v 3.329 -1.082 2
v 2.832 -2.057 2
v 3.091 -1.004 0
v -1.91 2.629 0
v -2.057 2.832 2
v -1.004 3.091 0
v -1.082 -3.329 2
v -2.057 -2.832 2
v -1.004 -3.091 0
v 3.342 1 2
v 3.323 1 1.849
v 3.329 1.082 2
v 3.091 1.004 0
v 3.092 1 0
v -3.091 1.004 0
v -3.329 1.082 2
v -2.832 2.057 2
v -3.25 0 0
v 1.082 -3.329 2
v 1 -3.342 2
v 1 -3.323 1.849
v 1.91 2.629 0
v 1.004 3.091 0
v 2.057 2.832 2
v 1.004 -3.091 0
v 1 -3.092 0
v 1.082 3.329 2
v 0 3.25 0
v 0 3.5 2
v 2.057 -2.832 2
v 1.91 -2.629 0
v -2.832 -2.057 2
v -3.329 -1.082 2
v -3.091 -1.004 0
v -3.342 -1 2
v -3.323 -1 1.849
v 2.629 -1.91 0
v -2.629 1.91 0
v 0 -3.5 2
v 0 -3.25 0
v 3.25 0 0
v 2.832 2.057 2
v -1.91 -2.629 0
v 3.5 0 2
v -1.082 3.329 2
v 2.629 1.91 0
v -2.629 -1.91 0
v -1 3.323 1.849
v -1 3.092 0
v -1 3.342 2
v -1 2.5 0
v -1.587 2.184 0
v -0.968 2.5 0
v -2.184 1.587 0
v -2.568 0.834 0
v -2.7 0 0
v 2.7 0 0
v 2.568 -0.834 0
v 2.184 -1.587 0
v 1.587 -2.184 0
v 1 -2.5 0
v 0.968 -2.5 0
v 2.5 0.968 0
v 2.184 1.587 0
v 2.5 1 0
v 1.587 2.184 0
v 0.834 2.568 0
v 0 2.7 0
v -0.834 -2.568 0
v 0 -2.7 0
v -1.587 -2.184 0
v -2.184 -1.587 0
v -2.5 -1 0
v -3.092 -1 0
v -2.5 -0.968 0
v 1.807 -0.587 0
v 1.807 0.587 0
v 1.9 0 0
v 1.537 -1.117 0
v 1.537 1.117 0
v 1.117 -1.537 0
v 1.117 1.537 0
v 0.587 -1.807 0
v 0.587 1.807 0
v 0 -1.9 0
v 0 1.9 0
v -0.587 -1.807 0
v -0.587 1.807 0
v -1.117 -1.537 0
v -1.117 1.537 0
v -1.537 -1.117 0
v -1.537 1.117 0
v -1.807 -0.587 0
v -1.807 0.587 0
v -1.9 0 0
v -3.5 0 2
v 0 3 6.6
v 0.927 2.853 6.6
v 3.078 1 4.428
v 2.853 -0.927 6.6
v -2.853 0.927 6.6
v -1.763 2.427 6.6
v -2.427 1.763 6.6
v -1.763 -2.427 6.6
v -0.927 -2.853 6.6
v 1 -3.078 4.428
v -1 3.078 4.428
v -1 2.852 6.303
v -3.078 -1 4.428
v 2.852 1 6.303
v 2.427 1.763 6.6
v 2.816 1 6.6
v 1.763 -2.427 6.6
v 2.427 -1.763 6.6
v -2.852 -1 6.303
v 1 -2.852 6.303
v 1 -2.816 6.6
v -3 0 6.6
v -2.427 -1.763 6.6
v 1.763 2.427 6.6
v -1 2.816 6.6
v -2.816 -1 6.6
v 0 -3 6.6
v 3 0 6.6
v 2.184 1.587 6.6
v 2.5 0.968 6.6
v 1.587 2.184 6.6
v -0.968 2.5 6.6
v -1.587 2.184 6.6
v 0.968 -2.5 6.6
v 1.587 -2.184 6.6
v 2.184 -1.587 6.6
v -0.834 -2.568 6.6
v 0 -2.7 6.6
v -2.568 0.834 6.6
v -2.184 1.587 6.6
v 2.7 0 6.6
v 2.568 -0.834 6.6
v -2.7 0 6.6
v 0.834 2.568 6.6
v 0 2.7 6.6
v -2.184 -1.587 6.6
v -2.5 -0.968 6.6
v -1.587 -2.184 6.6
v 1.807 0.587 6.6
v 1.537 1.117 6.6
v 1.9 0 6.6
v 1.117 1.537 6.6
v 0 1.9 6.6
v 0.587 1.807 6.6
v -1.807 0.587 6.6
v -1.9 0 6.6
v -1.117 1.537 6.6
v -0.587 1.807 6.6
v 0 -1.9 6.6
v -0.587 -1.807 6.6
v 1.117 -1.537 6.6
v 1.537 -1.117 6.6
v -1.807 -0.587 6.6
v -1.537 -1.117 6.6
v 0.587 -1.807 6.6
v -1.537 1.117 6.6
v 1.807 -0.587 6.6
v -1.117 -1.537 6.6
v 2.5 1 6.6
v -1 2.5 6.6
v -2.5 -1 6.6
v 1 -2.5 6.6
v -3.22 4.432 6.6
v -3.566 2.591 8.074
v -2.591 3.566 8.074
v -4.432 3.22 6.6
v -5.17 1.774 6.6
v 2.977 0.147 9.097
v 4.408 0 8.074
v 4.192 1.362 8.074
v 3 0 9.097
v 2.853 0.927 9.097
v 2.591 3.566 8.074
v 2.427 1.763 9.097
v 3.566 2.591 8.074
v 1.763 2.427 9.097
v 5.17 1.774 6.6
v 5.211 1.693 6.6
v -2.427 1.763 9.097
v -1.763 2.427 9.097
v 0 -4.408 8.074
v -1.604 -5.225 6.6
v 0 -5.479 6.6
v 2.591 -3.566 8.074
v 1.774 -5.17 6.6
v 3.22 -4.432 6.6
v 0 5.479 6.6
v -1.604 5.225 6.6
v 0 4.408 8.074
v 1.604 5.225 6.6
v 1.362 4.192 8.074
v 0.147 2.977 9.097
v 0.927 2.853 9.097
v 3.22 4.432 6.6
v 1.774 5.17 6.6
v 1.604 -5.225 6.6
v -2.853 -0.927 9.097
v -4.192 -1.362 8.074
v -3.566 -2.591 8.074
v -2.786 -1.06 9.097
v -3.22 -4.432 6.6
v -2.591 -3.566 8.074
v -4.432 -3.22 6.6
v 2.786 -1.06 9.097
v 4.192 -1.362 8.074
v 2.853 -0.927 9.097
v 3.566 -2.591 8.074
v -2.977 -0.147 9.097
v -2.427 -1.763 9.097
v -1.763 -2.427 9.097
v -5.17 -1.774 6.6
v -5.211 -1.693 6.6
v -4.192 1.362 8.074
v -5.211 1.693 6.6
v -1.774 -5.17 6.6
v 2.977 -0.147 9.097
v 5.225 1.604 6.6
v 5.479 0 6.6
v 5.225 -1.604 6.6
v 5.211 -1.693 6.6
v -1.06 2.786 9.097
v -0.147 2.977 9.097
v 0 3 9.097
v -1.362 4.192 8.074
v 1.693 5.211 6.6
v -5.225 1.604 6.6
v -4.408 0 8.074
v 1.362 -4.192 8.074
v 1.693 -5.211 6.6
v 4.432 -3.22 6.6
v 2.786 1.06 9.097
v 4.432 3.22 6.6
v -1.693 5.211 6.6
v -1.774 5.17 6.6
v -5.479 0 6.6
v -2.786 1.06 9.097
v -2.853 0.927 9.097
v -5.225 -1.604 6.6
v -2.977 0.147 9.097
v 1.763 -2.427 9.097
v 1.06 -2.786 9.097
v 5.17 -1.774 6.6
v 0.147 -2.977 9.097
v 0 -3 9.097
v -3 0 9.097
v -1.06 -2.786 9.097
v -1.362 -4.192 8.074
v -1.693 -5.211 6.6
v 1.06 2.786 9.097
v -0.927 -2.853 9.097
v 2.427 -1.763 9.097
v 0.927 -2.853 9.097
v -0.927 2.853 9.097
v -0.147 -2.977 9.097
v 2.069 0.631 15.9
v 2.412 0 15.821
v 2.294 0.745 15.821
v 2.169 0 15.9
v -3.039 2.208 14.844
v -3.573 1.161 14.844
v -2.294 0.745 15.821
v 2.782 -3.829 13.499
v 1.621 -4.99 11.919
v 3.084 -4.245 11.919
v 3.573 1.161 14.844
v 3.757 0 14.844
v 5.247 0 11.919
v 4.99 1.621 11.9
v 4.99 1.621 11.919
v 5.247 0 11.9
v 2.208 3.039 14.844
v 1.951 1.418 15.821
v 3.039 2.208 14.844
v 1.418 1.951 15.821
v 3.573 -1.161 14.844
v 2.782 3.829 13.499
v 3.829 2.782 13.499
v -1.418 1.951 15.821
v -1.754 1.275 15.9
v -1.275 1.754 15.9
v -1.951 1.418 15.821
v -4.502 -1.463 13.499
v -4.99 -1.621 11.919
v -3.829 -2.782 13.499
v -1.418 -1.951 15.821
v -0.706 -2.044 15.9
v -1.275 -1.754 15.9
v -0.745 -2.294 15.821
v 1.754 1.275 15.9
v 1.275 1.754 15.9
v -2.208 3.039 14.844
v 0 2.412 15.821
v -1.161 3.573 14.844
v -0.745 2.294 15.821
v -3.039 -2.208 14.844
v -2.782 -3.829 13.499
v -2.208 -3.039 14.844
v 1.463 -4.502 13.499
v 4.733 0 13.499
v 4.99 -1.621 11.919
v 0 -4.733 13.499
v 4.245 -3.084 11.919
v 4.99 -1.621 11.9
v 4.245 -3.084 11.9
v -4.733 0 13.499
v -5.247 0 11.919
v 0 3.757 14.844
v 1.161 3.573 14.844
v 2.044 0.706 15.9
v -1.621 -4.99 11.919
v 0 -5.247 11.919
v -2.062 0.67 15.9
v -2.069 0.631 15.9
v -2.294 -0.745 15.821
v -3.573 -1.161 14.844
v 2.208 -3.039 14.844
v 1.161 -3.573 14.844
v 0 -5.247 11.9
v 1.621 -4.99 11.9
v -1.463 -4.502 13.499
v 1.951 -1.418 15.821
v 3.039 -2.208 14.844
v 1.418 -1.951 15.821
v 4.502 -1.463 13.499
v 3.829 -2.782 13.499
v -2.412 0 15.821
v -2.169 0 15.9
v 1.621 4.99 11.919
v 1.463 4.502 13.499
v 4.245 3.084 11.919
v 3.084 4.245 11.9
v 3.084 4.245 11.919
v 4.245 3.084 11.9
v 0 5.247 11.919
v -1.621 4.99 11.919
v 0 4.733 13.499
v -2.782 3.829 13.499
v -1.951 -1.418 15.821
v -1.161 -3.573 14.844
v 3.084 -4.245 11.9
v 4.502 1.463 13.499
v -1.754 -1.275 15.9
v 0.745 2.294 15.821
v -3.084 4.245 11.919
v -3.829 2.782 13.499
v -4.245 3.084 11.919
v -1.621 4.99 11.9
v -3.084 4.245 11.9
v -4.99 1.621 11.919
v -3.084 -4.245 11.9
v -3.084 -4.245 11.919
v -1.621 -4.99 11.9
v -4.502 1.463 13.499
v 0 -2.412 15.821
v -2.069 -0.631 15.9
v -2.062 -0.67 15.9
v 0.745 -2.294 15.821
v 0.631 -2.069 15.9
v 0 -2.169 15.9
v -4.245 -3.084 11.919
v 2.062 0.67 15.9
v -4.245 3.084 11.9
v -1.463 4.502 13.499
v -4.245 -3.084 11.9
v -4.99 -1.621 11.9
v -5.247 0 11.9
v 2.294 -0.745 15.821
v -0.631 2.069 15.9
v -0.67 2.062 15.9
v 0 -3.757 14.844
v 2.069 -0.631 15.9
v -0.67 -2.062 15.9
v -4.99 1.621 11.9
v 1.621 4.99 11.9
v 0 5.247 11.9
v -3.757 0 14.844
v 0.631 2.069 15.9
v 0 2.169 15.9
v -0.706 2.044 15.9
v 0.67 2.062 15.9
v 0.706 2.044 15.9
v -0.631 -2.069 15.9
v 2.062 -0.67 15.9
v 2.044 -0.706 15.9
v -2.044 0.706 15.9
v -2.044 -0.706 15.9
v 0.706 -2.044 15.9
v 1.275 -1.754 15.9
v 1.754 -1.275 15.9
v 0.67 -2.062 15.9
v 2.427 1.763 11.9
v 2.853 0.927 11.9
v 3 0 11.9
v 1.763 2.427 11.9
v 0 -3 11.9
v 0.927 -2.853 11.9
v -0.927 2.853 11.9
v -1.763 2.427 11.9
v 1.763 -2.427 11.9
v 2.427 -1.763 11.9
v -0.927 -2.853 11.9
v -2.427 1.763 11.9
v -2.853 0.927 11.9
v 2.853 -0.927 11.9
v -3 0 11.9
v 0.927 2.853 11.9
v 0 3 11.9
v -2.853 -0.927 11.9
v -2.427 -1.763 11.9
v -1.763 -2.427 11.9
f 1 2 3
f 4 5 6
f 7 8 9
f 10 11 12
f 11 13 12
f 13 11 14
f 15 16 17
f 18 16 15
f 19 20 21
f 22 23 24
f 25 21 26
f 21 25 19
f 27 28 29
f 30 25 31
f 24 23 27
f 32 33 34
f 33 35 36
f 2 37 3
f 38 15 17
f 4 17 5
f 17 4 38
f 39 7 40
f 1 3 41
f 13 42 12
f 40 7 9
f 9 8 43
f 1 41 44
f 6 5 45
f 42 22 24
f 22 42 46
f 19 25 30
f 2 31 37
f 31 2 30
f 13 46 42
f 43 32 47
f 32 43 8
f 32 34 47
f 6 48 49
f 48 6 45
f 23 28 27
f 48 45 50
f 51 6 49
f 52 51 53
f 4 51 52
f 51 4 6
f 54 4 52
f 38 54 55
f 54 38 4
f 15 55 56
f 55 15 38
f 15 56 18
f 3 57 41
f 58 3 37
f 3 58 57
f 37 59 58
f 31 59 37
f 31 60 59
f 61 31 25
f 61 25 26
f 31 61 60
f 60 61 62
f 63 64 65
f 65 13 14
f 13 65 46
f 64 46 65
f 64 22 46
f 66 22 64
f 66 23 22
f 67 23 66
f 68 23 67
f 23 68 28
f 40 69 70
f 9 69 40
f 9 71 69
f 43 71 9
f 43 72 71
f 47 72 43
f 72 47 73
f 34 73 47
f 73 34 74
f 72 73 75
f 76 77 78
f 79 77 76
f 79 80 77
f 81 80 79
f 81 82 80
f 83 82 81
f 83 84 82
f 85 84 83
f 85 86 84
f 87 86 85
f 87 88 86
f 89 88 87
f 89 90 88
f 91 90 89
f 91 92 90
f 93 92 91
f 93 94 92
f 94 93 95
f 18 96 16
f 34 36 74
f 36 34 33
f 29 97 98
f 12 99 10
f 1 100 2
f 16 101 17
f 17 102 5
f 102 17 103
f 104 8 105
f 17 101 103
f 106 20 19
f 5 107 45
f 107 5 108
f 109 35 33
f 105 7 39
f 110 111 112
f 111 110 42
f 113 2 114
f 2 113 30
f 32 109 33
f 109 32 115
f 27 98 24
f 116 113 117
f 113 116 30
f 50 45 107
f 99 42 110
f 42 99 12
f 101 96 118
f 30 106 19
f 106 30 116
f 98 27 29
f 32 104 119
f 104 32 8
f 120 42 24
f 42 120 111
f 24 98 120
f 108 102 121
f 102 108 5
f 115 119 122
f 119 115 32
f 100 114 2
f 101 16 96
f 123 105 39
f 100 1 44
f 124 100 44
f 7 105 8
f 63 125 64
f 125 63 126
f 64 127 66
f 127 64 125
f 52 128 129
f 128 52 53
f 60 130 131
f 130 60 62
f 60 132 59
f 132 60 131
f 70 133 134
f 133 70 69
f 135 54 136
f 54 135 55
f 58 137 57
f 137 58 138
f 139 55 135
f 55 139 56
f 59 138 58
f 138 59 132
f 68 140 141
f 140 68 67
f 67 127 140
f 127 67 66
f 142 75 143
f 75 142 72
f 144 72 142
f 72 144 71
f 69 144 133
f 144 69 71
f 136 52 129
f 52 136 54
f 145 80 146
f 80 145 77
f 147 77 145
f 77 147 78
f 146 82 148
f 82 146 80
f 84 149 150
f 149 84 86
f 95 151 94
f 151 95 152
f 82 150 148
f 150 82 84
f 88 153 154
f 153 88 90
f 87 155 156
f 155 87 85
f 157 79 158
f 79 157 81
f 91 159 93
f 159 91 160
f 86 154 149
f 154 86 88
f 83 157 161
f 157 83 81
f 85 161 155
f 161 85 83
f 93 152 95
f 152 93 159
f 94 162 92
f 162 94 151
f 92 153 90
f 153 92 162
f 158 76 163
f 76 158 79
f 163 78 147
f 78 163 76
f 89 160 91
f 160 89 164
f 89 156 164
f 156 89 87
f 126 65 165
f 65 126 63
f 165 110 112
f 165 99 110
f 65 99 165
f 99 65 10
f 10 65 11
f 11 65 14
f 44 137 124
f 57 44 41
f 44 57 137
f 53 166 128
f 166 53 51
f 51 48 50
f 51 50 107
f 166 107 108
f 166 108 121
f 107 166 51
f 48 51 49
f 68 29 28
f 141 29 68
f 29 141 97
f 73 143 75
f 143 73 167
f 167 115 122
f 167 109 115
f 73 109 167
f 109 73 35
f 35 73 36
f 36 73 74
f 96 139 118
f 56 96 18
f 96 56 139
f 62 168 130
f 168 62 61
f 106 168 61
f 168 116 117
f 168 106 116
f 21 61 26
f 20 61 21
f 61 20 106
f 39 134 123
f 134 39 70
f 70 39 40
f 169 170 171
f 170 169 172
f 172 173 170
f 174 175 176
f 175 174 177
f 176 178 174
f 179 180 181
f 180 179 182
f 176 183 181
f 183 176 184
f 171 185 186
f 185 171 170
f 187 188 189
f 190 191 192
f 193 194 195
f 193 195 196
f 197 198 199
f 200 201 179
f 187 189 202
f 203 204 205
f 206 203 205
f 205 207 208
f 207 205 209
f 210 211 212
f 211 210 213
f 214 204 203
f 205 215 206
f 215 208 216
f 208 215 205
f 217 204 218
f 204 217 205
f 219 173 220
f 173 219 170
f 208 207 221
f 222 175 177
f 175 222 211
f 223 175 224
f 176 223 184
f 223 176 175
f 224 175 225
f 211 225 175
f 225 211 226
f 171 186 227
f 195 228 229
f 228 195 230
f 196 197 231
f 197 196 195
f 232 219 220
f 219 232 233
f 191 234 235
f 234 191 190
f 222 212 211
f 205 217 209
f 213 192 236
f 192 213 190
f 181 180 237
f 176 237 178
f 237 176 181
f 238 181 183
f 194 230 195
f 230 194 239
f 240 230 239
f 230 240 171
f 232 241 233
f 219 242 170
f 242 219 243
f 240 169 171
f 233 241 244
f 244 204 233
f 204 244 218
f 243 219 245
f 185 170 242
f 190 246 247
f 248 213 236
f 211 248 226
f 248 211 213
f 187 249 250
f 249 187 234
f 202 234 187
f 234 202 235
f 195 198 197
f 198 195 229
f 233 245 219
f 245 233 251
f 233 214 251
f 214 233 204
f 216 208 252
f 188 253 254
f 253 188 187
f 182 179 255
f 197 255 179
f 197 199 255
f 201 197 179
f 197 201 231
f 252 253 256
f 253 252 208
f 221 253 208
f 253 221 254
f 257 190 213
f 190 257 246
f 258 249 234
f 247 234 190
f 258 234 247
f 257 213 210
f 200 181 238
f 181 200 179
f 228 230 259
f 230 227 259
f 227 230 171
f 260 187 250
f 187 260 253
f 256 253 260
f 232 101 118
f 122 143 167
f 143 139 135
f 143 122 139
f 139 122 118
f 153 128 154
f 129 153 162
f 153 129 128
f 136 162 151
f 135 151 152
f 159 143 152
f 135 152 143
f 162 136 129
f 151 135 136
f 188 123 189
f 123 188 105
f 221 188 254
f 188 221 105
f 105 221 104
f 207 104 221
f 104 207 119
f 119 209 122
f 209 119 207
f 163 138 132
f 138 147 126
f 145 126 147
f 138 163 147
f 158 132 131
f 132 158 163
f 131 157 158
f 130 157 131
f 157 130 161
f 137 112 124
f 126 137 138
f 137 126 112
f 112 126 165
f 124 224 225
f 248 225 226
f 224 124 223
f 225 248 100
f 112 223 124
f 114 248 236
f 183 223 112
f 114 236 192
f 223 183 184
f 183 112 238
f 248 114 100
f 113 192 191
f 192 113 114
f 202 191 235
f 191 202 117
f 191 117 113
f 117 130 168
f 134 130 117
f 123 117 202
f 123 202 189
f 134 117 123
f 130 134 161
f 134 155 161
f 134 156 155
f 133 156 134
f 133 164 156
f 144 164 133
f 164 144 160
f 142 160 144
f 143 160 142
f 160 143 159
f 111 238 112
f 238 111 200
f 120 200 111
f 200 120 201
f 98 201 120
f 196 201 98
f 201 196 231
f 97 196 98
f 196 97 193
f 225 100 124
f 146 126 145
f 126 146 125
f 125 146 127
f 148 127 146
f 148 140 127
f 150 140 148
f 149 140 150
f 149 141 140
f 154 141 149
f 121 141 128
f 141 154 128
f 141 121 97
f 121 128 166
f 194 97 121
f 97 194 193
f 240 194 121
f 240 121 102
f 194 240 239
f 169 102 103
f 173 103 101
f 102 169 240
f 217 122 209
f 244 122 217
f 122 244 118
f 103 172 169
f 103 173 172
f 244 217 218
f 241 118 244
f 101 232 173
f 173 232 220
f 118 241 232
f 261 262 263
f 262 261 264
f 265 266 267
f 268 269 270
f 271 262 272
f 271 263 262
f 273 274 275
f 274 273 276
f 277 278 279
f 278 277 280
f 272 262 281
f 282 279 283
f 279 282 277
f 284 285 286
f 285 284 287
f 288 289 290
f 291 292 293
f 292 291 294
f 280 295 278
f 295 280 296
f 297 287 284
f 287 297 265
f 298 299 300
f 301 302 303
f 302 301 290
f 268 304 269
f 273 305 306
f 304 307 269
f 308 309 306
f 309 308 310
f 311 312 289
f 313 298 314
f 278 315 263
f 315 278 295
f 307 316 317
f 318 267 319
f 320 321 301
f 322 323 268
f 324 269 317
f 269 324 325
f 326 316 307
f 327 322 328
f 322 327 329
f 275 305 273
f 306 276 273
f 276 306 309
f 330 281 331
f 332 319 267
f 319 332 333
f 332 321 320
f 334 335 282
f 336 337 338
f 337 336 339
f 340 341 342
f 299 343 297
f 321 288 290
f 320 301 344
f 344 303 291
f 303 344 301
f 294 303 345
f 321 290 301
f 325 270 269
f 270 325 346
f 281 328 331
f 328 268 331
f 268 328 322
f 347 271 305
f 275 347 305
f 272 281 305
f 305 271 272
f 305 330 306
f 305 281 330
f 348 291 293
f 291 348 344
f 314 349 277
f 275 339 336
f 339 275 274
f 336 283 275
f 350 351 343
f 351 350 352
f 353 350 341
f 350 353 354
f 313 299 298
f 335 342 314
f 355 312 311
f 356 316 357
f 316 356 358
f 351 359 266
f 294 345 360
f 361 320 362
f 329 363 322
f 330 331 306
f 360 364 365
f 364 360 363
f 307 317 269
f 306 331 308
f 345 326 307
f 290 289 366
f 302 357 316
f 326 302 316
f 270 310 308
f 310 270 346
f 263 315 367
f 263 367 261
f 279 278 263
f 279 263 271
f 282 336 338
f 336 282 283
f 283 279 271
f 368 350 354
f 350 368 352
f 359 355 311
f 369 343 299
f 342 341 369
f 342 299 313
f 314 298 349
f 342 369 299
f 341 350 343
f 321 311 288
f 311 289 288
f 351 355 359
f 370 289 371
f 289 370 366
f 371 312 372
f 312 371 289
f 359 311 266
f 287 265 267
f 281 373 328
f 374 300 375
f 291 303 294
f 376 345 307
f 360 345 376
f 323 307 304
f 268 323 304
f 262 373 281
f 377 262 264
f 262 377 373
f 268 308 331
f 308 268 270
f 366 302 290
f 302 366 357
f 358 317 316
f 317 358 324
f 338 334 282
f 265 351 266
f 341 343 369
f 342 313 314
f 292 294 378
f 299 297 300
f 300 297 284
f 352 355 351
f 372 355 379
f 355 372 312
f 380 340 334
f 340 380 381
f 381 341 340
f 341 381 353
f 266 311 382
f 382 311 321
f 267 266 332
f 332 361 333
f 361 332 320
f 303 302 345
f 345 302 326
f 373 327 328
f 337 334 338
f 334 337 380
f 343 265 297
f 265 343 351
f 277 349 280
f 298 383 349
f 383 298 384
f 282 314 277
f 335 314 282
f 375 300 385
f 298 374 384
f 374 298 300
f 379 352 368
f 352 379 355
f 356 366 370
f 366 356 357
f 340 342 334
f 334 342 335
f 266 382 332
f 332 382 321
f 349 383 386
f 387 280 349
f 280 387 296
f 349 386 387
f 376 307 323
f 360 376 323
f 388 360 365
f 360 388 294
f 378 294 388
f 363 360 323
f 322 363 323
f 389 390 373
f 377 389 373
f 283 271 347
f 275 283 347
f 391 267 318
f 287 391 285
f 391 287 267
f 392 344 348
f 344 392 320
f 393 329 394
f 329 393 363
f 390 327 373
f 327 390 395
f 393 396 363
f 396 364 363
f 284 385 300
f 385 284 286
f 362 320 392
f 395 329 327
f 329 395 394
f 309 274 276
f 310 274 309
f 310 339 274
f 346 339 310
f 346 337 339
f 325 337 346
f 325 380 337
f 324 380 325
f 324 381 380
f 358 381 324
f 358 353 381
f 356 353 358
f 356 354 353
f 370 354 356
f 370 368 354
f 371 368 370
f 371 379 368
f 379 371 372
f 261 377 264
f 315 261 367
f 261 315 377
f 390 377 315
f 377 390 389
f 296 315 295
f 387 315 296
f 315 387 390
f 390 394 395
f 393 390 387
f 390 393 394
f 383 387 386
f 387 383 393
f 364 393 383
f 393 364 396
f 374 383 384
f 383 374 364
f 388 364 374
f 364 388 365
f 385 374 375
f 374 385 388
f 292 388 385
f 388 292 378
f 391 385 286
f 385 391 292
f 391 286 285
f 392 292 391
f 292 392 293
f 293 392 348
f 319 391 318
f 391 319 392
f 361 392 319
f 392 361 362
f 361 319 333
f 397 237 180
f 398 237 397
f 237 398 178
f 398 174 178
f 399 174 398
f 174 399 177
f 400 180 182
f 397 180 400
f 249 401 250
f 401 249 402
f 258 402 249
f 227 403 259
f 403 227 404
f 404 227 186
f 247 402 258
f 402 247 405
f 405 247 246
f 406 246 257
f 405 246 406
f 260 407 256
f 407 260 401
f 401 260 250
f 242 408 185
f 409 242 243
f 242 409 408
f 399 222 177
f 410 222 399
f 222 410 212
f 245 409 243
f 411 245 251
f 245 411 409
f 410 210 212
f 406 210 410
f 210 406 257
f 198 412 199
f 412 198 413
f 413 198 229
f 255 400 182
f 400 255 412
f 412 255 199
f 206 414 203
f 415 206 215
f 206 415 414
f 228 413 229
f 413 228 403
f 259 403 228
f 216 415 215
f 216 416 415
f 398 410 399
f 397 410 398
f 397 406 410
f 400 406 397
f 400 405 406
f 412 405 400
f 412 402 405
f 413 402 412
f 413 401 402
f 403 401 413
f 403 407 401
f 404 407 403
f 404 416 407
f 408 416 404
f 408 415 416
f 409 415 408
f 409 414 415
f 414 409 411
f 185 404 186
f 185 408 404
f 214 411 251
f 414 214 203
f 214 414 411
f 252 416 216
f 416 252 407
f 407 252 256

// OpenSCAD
module sphereCap(a = 10, h = 4) {
	r = (a*a +h*h)/(2*h);
	translate([0,0,-r+h]) {
		difference() {
			sphere(r);
			translate([0,0,-h]) {
				cube(2*r,true);
			}
		}
	}
}

module tube(hauteur, rayon, epaisseur) {
	difference() {
		cylinder(hauteur,rayon,rayon);
		translate([0,0,-1]) {
			cylinder(hauteur+2,rayon-epaisseur,rayon-epaisseur);
		}
	}
}

module tz(z) {
	for (i = [0 : $children-1]) {
		translate([0,0,z]) {
			child(i);
		}
	}
}

$fn=20;

module bloqueur() {
	difference() {
		union() {
			cylinder(r1=3.25,r2=3.5, h=2);
			tz(2) cylinder(r1=3.5,r2=3, h=4.6);
		}
		tz(-0.5) {
			// zone vide de pinçage
			tube(8, 2.7, 0.8);
			for (angle = [0,90,180,270]) {
				rotate(angle) {
					translate([2.5,0,0]) cube([1.25,1,8]);
				}
			}
		}
	}
}

module axe() {
	cylinder(r=3,h=3.4);
}

module stop() {
	sphereCap(5.5, 3.3);
}

module rotule() {
	 difference() {
		sphereCap(5.25, 4.5);
		translate([-6,-6, 5-1]) cube([12,12,2]);
	}
}

union() {
	bloqueur();
	tz(6.6) stop();
	tz(8.5) axe();
	tz(11.9) rotule();
}
